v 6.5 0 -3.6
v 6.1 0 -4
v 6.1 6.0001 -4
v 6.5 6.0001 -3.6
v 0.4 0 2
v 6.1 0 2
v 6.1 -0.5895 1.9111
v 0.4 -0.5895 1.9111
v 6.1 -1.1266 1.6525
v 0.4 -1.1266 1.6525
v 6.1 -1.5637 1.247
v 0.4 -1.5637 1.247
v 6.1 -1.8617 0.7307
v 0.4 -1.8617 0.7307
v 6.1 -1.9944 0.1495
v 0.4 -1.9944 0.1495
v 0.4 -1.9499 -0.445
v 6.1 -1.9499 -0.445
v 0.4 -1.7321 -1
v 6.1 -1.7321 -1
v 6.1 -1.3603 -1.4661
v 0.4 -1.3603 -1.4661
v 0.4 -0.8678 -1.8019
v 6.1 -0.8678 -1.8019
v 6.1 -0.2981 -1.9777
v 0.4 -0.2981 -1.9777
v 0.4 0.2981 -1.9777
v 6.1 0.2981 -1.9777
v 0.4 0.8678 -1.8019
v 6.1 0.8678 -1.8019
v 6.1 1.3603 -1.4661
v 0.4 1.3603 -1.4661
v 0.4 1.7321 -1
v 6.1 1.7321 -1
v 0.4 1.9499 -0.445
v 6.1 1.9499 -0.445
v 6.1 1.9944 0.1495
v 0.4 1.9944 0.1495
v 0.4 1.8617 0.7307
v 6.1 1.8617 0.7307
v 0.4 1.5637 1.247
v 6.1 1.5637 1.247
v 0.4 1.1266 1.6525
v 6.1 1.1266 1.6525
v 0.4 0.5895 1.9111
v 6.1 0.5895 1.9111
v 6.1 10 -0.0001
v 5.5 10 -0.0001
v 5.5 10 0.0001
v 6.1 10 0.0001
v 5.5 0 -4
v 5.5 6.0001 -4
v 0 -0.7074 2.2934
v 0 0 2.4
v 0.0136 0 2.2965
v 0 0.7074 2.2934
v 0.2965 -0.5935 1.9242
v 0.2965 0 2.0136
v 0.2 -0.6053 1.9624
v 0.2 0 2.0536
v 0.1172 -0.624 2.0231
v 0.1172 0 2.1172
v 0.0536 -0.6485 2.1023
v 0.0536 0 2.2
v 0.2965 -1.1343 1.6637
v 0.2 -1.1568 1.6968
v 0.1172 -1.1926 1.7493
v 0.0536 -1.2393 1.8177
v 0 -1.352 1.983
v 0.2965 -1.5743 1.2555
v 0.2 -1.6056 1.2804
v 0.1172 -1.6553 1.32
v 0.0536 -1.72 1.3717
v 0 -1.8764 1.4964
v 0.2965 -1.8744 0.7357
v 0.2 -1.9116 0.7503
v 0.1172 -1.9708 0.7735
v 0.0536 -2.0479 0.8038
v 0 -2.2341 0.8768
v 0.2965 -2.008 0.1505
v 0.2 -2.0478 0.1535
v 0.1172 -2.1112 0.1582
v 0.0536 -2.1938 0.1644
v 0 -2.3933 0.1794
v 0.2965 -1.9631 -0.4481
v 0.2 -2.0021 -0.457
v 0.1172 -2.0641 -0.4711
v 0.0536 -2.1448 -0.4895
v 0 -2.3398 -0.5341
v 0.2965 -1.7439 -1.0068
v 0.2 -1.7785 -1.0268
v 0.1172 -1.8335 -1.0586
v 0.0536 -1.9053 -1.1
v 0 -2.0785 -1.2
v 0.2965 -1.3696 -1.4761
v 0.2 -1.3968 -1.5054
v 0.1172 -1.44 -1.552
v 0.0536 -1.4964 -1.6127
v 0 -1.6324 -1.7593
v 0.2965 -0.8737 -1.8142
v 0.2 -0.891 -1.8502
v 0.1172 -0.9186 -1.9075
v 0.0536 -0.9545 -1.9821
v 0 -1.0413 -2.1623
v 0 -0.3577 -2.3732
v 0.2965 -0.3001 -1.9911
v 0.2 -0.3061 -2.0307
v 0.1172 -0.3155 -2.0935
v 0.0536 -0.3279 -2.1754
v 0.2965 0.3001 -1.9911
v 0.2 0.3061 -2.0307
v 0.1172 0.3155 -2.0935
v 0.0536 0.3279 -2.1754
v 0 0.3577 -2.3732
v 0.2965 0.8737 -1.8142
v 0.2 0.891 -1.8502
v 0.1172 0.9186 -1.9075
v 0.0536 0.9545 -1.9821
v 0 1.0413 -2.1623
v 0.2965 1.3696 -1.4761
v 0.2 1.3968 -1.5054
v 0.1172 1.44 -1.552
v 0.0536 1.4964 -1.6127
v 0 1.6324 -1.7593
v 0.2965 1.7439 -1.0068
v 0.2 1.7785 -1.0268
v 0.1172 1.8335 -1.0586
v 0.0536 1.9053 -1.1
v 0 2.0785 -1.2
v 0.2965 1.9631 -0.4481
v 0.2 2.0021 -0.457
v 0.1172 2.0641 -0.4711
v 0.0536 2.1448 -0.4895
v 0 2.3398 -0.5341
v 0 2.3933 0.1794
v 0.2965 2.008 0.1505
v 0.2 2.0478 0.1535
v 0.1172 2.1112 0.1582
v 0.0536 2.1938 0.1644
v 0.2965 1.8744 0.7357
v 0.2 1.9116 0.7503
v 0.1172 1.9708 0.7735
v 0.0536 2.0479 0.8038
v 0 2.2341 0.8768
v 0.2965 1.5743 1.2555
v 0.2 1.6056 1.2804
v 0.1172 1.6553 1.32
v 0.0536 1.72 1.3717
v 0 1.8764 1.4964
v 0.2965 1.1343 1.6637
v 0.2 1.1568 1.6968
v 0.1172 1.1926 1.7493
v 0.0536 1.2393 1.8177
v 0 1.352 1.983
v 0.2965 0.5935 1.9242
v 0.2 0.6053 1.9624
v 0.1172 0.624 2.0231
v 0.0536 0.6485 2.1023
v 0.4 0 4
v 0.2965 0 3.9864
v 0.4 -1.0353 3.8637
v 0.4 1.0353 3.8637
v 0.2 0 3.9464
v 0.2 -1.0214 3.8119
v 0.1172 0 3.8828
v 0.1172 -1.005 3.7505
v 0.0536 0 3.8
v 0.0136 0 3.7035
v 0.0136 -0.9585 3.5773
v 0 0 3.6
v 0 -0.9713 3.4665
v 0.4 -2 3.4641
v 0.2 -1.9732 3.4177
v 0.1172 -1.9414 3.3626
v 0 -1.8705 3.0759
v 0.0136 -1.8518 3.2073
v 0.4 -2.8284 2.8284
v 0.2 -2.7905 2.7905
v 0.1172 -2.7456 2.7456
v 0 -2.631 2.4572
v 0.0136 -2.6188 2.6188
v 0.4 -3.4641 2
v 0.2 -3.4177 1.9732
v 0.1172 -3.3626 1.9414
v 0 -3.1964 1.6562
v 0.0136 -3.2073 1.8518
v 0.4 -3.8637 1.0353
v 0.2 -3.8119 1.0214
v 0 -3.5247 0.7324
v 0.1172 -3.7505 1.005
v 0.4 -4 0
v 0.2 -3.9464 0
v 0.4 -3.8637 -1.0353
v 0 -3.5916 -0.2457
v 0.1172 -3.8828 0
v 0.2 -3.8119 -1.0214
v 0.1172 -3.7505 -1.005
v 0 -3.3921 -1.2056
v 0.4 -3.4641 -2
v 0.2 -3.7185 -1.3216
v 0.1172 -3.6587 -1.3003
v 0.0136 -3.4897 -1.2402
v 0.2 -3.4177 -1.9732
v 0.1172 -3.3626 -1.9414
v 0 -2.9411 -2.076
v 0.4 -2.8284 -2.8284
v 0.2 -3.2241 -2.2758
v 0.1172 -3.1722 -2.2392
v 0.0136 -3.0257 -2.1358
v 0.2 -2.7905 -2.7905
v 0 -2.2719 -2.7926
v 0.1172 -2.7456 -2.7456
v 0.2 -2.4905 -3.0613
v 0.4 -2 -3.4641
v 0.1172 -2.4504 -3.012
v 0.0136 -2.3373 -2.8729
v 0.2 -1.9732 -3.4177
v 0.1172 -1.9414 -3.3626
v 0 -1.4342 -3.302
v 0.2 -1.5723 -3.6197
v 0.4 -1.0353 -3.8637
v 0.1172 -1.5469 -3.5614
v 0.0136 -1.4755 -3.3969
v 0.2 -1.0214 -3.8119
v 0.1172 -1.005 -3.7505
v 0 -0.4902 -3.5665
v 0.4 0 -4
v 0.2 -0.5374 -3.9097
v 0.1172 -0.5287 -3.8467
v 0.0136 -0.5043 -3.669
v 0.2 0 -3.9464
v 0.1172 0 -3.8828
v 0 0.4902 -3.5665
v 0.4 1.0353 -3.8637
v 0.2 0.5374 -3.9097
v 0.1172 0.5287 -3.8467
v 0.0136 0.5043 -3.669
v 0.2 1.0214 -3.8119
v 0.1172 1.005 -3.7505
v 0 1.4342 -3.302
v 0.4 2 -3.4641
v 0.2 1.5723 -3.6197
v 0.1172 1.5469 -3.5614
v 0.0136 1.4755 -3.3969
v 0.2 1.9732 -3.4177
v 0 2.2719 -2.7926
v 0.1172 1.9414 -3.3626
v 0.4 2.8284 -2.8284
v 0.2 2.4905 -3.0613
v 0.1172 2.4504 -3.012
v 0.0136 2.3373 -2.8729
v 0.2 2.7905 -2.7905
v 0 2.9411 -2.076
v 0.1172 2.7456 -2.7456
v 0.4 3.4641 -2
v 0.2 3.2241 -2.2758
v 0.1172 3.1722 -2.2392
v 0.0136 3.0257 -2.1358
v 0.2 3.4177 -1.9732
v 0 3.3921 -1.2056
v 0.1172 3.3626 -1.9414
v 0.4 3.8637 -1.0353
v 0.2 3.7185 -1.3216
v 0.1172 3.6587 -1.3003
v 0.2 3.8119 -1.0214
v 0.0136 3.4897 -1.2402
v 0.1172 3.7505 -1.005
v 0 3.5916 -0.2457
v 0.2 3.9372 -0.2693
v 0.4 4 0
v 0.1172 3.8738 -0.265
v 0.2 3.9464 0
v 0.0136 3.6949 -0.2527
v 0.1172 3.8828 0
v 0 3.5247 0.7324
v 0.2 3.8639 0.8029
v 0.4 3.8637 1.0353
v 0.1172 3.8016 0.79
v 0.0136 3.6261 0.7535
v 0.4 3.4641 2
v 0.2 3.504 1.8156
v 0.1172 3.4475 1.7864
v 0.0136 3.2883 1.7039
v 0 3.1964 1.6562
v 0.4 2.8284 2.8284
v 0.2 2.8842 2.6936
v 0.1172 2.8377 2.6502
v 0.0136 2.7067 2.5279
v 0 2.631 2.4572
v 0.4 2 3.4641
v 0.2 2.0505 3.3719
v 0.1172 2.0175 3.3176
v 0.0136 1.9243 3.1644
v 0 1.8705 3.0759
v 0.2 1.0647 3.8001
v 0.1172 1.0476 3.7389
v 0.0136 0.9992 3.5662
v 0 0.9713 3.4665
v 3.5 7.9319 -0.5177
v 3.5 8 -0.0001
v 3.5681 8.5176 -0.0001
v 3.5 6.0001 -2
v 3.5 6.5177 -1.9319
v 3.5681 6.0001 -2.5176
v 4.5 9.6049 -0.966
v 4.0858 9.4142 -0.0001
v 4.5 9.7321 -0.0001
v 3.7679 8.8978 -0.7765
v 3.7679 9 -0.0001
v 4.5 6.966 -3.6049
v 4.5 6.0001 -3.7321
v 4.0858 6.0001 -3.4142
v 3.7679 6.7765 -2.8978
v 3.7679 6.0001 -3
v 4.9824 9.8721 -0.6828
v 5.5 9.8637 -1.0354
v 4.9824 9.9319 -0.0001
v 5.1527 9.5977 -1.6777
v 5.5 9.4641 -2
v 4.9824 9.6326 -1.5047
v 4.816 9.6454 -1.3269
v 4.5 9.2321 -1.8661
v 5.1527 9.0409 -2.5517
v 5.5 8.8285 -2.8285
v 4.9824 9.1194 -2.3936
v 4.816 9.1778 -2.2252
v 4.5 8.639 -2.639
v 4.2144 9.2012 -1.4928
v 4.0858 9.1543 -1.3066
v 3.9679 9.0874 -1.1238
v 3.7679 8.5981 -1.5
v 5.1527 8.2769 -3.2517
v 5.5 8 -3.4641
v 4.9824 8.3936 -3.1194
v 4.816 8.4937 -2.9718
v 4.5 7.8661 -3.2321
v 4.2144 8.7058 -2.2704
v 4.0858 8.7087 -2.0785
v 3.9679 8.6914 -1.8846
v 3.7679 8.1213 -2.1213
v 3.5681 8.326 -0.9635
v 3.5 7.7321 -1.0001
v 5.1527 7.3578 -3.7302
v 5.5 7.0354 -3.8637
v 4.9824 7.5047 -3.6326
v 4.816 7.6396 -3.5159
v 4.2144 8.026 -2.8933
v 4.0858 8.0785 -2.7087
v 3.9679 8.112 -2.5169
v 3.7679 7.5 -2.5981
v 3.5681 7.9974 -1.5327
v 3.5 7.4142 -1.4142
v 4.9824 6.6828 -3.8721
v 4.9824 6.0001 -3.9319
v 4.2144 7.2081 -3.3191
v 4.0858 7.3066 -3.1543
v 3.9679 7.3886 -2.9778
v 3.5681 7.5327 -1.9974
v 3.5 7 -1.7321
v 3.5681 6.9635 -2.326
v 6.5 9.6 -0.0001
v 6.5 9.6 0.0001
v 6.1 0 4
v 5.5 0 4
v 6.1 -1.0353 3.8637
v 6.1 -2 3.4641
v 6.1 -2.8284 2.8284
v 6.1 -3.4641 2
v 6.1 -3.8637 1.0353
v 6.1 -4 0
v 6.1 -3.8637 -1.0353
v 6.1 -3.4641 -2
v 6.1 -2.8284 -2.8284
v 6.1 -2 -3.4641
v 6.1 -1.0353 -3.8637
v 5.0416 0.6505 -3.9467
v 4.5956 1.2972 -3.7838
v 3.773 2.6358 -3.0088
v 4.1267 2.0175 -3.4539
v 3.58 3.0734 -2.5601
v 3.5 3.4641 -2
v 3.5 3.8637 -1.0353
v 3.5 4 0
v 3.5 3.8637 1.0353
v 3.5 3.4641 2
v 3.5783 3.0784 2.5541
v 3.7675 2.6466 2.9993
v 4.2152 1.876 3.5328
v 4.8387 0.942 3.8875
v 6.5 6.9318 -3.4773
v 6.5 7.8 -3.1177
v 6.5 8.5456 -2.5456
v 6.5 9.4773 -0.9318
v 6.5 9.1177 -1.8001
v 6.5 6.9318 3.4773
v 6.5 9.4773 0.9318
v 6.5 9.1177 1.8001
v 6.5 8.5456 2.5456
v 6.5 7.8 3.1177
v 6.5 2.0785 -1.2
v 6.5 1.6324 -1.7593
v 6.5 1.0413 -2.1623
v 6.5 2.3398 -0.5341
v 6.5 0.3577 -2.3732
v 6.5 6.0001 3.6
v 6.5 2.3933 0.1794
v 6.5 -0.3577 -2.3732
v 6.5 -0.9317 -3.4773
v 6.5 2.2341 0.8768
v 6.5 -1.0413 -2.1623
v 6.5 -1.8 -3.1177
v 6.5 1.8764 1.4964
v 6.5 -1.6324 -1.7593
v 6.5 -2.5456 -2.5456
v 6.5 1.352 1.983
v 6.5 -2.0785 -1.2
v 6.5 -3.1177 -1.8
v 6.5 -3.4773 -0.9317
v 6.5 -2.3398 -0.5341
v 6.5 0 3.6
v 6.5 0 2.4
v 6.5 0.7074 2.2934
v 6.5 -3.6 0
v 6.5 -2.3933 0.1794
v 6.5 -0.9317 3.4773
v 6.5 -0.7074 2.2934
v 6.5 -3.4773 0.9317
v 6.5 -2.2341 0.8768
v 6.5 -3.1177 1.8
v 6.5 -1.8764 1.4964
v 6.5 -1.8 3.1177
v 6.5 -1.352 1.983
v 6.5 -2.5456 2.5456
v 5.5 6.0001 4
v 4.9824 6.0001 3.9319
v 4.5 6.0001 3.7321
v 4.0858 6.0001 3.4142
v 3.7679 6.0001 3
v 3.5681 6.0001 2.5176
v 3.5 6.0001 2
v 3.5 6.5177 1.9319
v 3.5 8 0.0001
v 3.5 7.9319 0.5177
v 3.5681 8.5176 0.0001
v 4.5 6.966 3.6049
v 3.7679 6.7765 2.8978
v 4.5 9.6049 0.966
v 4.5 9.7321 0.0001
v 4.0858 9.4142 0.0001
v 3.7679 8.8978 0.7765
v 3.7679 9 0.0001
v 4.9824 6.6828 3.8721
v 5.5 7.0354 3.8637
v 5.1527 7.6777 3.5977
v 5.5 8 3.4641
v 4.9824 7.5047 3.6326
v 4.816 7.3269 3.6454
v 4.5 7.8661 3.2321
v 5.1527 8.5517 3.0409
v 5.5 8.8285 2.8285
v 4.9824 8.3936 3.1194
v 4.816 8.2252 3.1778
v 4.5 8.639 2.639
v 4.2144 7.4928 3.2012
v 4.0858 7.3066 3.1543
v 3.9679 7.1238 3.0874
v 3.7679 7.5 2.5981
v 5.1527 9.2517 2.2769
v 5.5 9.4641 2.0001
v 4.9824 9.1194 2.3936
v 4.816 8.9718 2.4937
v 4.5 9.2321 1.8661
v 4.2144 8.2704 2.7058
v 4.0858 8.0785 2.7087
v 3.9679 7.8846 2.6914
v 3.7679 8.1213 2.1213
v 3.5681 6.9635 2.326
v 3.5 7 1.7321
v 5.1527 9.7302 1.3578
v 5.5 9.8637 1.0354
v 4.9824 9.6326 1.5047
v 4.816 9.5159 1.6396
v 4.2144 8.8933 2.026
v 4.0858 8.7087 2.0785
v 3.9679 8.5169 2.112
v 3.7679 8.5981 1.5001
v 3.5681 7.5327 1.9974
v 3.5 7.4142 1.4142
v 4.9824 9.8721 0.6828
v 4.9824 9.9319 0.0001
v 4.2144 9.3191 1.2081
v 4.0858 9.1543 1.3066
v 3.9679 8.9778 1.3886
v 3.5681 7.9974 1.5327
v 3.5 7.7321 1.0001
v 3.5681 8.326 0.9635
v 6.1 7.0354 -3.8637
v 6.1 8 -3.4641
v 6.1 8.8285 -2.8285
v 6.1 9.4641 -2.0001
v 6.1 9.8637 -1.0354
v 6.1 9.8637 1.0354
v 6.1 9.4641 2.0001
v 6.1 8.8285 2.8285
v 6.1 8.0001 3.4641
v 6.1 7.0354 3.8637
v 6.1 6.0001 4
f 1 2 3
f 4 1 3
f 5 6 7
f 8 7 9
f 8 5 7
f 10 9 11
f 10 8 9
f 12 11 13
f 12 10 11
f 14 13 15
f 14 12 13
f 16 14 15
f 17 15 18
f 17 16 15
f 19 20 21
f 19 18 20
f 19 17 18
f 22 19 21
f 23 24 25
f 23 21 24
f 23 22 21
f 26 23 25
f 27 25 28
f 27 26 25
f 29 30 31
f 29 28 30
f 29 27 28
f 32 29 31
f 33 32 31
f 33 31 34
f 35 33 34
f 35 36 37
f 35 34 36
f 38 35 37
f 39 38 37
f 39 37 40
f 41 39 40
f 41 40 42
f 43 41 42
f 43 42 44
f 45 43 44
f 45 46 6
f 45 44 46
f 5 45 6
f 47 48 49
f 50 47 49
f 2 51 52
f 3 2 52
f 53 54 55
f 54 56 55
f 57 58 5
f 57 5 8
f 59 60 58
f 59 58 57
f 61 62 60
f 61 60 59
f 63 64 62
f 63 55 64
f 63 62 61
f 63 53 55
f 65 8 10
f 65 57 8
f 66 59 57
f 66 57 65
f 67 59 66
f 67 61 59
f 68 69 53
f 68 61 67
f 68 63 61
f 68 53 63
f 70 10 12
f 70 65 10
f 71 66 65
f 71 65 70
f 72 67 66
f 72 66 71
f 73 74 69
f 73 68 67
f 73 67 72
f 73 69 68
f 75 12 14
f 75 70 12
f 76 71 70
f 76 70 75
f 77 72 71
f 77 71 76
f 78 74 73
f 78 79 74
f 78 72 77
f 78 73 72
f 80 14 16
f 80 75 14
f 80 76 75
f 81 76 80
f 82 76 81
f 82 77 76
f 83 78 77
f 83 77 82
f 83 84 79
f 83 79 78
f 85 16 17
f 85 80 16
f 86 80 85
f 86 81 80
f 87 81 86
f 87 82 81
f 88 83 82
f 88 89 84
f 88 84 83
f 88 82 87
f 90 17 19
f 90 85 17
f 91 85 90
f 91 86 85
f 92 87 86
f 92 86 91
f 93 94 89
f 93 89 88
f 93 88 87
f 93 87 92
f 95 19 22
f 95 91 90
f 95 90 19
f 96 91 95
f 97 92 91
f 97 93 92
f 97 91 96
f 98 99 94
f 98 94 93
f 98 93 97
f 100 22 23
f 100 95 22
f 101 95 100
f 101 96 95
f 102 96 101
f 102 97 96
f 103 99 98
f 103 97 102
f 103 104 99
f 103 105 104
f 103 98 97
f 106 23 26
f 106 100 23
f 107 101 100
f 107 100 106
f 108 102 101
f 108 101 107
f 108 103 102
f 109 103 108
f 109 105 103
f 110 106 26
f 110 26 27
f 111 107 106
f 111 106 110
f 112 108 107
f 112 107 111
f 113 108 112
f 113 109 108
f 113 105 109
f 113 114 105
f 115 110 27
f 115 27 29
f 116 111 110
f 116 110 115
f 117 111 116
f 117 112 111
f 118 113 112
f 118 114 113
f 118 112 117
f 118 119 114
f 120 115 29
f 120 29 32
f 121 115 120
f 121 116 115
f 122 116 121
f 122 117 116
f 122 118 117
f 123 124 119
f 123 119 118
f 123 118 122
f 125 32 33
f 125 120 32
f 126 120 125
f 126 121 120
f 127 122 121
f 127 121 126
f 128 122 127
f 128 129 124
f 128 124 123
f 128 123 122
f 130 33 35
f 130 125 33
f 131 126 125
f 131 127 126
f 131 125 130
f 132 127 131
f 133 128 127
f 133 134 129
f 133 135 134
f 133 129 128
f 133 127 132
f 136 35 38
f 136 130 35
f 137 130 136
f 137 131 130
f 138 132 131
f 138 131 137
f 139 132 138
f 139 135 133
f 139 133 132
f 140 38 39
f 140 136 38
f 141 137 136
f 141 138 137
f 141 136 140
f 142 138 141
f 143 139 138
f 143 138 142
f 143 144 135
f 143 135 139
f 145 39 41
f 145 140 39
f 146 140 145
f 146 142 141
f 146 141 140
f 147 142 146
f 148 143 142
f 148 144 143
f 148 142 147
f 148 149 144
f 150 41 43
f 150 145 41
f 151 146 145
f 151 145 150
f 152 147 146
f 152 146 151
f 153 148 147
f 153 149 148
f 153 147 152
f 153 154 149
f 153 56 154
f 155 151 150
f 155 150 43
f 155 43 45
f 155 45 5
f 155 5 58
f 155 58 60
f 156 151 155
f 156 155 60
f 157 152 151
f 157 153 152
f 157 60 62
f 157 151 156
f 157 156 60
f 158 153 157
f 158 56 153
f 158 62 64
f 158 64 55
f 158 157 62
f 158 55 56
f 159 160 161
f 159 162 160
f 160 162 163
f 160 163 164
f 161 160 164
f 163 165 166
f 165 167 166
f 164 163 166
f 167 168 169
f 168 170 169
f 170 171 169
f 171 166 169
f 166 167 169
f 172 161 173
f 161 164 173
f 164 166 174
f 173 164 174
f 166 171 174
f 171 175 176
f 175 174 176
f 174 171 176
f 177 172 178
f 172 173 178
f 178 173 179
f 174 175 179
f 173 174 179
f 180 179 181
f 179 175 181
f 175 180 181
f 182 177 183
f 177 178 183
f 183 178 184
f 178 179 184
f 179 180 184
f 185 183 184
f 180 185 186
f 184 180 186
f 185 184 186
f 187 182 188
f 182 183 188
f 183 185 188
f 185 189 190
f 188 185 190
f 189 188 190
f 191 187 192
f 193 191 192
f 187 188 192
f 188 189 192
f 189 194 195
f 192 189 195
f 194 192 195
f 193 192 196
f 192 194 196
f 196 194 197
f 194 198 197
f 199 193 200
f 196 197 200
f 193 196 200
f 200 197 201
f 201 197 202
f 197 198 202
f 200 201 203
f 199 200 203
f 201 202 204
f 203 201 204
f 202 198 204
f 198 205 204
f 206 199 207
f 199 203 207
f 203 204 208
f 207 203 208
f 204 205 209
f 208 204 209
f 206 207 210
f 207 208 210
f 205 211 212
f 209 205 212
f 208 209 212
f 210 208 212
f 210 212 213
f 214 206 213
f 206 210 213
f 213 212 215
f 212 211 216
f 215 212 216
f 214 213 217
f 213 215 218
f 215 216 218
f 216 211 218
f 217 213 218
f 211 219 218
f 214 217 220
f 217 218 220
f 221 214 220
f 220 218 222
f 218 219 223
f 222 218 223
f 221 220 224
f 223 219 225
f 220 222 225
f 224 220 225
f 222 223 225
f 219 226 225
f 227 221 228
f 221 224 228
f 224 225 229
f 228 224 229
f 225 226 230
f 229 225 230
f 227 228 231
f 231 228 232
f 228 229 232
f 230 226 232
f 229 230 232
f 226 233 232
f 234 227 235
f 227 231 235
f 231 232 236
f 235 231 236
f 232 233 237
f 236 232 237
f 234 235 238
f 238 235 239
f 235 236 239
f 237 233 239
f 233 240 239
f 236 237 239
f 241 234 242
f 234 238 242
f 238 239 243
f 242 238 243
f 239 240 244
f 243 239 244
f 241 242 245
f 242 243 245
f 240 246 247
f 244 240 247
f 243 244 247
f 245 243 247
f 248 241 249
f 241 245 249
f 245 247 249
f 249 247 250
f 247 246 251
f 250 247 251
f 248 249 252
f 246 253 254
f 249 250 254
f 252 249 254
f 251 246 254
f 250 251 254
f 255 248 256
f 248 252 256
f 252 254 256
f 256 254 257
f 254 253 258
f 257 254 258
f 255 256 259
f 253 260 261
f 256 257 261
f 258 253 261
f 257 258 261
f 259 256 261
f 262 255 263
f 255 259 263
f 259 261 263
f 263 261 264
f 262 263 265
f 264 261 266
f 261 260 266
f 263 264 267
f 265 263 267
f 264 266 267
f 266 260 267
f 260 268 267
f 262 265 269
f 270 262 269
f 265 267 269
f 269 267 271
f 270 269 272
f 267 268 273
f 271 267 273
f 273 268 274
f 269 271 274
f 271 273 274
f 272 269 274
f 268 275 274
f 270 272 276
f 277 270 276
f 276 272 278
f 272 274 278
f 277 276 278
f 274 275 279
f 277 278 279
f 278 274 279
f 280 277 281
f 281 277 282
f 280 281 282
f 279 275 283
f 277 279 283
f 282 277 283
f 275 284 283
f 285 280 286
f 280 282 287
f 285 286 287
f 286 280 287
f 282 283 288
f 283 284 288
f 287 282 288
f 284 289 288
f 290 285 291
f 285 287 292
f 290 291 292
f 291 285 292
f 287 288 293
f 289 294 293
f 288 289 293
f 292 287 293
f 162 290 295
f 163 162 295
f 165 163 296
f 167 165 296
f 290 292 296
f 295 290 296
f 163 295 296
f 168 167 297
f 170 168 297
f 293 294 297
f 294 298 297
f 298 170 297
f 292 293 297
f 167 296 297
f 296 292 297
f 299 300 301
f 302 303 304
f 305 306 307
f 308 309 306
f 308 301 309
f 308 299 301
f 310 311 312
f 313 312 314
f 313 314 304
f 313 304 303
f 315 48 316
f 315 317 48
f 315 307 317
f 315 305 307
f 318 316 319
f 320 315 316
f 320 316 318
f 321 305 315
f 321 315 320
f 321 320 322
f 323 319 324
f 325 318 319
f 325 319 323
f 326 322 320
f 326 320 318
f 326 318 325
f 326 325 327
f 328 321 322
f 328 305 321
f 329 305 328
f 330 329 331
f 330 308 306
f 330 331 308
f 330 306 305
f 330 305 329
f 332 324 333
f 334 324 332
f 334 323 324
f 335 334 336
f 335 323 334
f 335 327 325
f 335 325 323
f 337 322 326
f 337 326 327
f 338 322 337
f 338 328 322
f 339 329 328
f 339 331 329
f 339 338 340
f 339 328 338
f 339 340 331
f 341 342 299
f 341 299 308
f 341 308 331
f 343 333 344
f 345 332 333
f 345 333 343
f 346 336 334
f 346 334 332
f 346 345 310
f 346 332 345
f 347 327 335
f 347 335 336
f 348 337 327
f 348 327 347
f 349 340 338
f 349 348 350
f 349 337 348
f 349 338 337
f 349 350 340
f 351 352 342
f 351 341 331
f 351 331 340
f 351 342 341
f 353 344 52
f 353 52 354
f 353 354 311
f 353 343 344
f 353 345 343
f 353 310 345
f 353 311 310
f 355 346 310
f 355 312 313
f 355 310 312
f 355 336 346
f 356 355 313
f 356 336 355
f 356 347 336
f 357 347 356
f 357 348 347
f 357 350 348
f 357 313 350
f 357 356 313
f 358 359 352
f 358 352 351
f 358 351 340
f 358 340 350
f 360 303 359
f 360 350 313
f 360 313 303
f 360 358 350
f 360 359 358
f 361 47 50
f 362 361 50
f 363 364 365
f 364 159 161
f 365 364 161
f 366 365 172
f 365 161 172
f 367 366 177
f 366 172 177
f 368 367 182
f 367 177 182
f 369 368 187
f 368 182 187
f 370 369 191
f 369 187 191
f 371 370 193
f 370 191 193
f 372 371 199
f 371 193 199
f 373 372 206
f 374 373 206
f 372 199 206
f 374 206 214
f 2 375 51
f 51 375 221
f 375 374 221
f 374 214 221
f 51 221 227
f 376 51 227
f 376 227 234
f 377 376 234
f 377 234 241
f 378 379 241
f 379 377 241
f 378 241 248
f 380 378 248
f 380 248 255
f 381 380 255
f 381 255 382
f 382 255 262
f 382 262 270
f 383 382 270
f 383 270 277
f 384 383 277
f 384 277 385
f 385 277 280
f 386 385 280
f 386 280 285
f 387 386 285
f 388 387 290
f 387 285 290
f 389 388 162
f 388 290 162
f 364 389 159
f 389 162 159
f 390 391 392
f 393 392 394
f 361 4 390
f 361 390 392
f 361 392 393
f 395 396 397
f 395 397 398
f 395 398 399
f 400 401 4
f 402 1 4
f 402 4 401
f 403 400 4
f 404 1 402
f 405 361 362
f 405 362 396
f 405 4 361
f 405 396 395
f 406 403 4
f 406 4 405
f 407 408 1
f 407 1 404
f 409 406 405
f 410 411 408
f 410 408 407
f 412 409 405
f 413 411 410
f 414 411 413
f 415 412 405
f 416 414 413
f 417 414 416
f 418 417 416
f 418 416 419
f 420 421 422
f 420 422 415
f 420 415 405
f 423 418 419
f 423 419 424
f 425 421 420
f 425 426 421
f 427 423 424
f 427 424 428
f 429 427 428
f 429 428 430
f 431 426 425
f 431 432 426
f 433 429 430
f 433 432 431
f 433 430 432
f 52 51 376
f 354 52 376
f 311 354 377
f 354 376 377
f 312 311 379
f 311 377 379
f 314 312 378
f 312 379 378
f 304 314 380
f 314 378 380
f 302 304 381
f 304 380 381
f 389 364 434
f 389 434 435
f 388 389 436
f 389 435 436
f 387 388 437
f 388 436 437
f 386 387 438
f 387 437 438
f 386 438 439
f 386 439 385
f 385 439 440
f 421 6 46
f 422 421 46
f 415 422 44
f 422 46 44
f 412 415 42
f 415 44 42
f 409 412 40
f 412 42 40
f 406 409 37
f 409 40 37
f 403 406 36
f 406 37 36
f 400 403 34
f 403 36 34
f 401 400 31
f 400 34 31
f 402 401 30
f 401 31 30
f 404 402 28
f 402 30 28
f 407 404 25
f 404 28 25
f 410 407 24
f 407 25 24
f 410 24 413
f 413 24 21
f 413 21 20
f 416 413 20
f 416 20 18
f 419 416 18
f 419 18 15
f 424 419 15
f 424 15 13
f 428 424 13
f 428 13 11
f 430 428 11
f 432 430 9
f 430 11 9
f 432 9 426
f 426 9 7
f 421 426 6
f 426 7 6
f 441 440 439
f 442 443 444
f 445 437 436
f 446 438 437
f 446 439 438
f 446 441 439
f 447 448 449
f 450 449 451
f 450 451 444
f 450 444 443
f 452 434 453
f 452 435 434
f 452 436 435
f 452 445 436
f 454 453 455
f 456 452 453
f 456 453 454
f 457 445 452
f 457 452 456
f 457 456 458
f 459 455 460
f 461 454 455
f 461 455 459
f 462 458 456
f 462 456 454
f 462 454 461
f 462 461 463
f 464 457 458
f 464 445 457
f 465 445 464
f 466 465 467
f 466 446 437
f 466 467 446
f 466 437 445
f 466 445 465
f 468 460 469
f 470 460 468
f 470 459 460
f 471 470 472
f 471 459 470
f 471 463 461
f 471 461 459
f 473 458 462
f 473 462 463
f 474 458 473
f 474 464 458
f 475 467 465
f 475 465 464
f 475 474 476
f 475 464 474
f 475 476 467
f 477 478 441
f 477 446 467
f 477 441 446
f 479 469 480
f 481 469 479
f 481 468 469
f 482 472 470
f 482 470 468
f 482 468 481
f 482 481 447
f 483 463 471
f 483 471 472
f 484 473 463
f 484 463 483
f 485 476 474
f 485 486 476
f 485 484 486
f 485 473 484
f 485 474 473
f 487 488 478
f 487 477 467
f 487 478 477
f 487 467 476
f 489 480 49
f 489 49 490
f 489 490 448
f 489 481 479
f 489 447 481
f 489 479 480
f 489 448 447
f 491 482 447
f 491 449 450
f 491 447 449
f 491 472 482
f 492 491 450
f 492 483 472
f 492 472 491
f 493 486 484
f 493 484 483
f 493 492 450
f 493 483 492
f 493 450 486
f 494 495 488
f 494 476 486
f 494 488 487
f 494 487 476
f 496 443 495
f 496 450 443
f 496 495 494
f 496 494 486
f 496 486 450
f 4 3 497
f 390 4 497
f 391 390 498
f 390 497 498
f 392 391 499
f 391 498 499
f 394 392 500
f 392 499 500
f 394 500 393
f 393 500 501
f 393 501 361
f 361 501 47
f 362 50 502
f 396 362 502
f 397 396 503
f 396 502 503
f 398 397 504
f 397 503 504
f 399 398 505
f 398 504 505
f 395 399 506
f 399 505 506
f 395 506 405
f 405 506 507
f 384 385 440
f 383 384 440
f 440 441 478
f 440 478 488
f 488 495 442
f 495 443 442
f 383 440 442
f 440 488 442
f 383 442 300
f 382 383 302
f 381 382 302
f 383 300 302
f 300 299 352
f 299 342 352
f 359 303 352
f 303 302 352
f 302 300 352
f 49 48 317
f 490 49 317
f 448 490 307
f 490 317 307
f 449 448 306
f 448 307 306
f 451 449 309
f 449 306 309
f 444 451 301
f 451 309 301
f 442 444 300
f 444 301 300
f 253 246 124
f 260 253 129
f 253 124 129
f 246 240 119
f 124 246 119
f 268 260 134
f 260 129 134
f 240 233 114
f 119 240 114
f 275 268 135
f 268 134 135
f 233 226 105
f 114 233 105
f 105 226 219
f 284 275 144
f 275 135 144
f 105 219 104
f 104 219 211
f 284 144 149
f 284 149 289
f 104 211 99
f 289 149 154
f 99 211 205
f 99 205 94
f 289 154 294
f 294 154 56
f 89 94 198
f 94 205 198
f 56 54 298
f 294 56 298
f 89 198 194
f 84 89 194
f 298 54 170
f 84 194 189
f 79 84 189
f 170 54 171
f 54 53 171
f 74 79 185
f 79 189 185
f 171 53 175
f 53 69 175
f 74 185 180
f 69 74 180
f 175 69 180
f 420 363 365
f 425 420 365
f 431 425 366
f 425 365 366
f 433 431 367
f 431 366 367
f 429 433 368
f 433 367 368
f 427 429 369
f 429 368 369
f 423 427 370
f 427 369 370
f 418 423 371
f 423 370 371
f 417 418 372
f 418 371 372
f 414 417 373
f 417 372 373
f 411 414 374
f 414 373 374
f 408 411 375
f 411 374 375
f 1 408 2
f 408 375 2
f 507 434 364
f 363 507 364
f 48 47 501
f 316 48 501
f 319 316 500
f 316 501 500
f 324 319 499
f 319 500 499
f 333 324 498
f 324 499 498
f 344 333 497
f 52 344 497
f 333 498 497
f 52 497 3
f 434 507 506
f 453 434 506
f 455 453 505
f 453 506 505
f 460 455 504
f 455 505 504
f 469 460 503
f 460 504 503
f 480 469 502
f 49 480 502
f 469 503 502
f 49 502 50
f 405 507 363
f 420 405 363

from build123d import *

# Parameters (mm, degrees)
SKETCH_1_R      = 4
SKETCH_1_R_2    = 2
EXTRUDE_1_DEPTH = 6.5
EXTRUDE_START   = -3
EXTRUDE_2_DEPTH = 3
FILLET_1_R      = 4
CHAMFER_1_SIZE  = 0.4
FILLET_2_R      = 2
FILLET_3_R      = 0.4


# Some blends are built 0.0001 mm under size
with BuildPart() as part:
    # 草图1 → 凸台-拉伸1 (new body)
    with BuildSketch(Plane(origin=(0, 0, 0), x_dir=(0, 0, -1), z_dir=(1, 0, 0))):
        with Locations(Location((0, 0, 0), (0, 0, 180))):
            Circle(SKETCH_1_R)
        with Locations(Location((0, 0, 0), (0, 0, 180))):
            Circle(SKETCH_1_R_2, mode=Mode.SUBTRACT)
    extrude(amount=EXTRUDE_1_DEPTH)

    # 草图2 → 凸台-拉伸2 (add)
    with BuildSketch(Plane(origin=(6.5, 0, 0), x_dir=(0, 0, -1), z_dir=(1, 0, 0)).offset(EXTRUDE_START)):
        with BuildLine():
            Line((2, 0), (4, 0))
            Line((4, 0), (4, 10))
            Line((4, 10), (-4, 10))
            Line((-4, 10), (-4, 0))
            Line((-4, 0), (-2, 0))
            ThreePointArc((-2, 0), (0, 2), (2, 0))
        make_face()
    extrude(amount=EXTRUDE_2_DEPTH)

    # 圆角1
    fillet_1_edges = [part.edges().sort_by_distance(p)[0] for p in [
        (5, 10, -4),
        (5, 10, 4),
    ]]
    fillet(fillet_1_edges, radius=FILLET_1_R - 0.0001)  # a hair under: the kernel refuses the full size

    # 倒角1
    chamfer_1_edges = [part.edges().sort_by_distance(p)[0] for p in [
        (6.5, -4, 0),
        (6.5, 3.00005, -4),
        (6.5, 3.00005, 4),
        (6.5, 8.828456414, 2.828456414),
        (6.5, 8.828456414, -2.828456414),
        (6.5, 0, -2),
    ]]
    chamfer(chamfer_1_edges, length=CHAMFER_1_SIZE)

    # 圆角2
    # the kernel refuses this fillet: 2 mm, written as the material it takes off along each edge
    with BuildSketch(Plane(origin=(3.5, -5, -4), x_dir=(0, 0, 1), z_dir=(0, 1, 0))) as fillet_2_piece_1_section:
        with BuildLine():
            CenterArc((FILLET_2_R, FILLET_2_R), FILLET_2_R, 180, 90)
            Line((0, FILLET_2_R), (0, 0))
            Line((0, 0), (FILLET_2_R, 0))
        make_face()
    fillet_2_piece_1 = extrude(amount=11.0001, mode=Mode.PRIVATE)
    fillet_2_piece_1 = fillet_2_piece_1 - Plane(origin=(4.073639318, 0, 0), x_dir=(0, 0, 1), z_dir=(-1, 0, 0)) * Cylinder(4, 31, mode=Mode.PRIVATE)
    add(fillet_2_piece_1, mode=Mode.SUBTRACT)
    with BuildSketch(Plane(origin=(3.5, 6.0001, 4), x_dir=(1, 0, 0), z_dir=(0, -1, 0))) as fillet_2_piece_2_section:
        with BuildLine():
            CenterArc((FILLET_2_R, -FILLET_2_R), FILLET_2_R, 90, 90)
            Line((0, -FILLET_2_R), (0, 0))
            Line((0, 0), (FILLET_2_R, 0))
        make_face()
    fillet_2_piece_2 = extrude(amount=11.0001, mode=Mode.PRIVATE)
    fillet_2_piece_2 = fillet_2_piece_2 - Plane(origin=(4.073638991, 0, 0), x_dir=(0, 0, 1), z_dir=(-1, 0, 0)) * Cylinder(4, 31, mode=Mode.PRIVATE)
    add(fillet_2_piece_2, mode=Mode.SUBTRACT)
    with BuildSketch(Plane(origin=(3.5, 6.0001, 0.0001), x_dir=(0, 0, 1), z_dir=(0, -1, 0))) as fillet_2_piece_3:
        with BuildLine():
            CenterArc((3.9999 - FILLET_2_R, -FILLET_2_R), FILLET_2_R, 0, 90)
            Line((3.9999 - FILLET_2_R, 0), (3.9999, 0))
            Line((3.9999, 0), (3.9999, -FILLET_2_R))
        make_face()
    revolve(axis=Axis((3.5, 6.0001, 0.0001), (-1, 0, 0)), revolution_arc=90, mode=Mode.SUBTRACT)
    with BuildSketch(Plane(origin=(3.5, 6.0001, -0.0001), x_dir=(0, 1, 0), z_dir=(0, 0, 1))) as fillet_2_piece_4:
        with BuildLine():
            CenterArc((3.9999 - FILLET_2_R, -FILLET_2_R), FILLET_2_R, 0, 90)
            Line((3.9999, -FILLET_2_R), (3.9999, 0))
            Line((3.9999, 0), (3.9999 - FILLET_2_R, 0))
        make_face()
    revolve(axis=Axis((3.5, 6.0001, -0.0001), (-1, 0, 0)), revolution_arc=90, mode=Mode.SUBTRACT)
    with BuildSketch(Plane(origin=(3.5, 10, -0.0001), x_dir=(0, -1, 0), z_dir=(0, 0, 1))) as fillet_2_piece_5:
        with BuildLine():
            CenterArc((FILLET_2_R, FILLET_2_R), FILLET_2_R, 180, 90)
            Line((0, FILLET_2_R), (0, 0))
            Line((0, 0), (FILLET_2_R, 0))
        make_face()
    extrude(amount=0.0002, mode=Mode.SUBTRACT)

    # 圆角3
    fillet_3_edges = [part.edges().sort_by_distance(p)[0] for p in [
        (0, 0, -4),
        (0, 0, -2),
    ]]
    fillet(fillet_3_edges, radius=FILLET_3_R)


solid = part.part
